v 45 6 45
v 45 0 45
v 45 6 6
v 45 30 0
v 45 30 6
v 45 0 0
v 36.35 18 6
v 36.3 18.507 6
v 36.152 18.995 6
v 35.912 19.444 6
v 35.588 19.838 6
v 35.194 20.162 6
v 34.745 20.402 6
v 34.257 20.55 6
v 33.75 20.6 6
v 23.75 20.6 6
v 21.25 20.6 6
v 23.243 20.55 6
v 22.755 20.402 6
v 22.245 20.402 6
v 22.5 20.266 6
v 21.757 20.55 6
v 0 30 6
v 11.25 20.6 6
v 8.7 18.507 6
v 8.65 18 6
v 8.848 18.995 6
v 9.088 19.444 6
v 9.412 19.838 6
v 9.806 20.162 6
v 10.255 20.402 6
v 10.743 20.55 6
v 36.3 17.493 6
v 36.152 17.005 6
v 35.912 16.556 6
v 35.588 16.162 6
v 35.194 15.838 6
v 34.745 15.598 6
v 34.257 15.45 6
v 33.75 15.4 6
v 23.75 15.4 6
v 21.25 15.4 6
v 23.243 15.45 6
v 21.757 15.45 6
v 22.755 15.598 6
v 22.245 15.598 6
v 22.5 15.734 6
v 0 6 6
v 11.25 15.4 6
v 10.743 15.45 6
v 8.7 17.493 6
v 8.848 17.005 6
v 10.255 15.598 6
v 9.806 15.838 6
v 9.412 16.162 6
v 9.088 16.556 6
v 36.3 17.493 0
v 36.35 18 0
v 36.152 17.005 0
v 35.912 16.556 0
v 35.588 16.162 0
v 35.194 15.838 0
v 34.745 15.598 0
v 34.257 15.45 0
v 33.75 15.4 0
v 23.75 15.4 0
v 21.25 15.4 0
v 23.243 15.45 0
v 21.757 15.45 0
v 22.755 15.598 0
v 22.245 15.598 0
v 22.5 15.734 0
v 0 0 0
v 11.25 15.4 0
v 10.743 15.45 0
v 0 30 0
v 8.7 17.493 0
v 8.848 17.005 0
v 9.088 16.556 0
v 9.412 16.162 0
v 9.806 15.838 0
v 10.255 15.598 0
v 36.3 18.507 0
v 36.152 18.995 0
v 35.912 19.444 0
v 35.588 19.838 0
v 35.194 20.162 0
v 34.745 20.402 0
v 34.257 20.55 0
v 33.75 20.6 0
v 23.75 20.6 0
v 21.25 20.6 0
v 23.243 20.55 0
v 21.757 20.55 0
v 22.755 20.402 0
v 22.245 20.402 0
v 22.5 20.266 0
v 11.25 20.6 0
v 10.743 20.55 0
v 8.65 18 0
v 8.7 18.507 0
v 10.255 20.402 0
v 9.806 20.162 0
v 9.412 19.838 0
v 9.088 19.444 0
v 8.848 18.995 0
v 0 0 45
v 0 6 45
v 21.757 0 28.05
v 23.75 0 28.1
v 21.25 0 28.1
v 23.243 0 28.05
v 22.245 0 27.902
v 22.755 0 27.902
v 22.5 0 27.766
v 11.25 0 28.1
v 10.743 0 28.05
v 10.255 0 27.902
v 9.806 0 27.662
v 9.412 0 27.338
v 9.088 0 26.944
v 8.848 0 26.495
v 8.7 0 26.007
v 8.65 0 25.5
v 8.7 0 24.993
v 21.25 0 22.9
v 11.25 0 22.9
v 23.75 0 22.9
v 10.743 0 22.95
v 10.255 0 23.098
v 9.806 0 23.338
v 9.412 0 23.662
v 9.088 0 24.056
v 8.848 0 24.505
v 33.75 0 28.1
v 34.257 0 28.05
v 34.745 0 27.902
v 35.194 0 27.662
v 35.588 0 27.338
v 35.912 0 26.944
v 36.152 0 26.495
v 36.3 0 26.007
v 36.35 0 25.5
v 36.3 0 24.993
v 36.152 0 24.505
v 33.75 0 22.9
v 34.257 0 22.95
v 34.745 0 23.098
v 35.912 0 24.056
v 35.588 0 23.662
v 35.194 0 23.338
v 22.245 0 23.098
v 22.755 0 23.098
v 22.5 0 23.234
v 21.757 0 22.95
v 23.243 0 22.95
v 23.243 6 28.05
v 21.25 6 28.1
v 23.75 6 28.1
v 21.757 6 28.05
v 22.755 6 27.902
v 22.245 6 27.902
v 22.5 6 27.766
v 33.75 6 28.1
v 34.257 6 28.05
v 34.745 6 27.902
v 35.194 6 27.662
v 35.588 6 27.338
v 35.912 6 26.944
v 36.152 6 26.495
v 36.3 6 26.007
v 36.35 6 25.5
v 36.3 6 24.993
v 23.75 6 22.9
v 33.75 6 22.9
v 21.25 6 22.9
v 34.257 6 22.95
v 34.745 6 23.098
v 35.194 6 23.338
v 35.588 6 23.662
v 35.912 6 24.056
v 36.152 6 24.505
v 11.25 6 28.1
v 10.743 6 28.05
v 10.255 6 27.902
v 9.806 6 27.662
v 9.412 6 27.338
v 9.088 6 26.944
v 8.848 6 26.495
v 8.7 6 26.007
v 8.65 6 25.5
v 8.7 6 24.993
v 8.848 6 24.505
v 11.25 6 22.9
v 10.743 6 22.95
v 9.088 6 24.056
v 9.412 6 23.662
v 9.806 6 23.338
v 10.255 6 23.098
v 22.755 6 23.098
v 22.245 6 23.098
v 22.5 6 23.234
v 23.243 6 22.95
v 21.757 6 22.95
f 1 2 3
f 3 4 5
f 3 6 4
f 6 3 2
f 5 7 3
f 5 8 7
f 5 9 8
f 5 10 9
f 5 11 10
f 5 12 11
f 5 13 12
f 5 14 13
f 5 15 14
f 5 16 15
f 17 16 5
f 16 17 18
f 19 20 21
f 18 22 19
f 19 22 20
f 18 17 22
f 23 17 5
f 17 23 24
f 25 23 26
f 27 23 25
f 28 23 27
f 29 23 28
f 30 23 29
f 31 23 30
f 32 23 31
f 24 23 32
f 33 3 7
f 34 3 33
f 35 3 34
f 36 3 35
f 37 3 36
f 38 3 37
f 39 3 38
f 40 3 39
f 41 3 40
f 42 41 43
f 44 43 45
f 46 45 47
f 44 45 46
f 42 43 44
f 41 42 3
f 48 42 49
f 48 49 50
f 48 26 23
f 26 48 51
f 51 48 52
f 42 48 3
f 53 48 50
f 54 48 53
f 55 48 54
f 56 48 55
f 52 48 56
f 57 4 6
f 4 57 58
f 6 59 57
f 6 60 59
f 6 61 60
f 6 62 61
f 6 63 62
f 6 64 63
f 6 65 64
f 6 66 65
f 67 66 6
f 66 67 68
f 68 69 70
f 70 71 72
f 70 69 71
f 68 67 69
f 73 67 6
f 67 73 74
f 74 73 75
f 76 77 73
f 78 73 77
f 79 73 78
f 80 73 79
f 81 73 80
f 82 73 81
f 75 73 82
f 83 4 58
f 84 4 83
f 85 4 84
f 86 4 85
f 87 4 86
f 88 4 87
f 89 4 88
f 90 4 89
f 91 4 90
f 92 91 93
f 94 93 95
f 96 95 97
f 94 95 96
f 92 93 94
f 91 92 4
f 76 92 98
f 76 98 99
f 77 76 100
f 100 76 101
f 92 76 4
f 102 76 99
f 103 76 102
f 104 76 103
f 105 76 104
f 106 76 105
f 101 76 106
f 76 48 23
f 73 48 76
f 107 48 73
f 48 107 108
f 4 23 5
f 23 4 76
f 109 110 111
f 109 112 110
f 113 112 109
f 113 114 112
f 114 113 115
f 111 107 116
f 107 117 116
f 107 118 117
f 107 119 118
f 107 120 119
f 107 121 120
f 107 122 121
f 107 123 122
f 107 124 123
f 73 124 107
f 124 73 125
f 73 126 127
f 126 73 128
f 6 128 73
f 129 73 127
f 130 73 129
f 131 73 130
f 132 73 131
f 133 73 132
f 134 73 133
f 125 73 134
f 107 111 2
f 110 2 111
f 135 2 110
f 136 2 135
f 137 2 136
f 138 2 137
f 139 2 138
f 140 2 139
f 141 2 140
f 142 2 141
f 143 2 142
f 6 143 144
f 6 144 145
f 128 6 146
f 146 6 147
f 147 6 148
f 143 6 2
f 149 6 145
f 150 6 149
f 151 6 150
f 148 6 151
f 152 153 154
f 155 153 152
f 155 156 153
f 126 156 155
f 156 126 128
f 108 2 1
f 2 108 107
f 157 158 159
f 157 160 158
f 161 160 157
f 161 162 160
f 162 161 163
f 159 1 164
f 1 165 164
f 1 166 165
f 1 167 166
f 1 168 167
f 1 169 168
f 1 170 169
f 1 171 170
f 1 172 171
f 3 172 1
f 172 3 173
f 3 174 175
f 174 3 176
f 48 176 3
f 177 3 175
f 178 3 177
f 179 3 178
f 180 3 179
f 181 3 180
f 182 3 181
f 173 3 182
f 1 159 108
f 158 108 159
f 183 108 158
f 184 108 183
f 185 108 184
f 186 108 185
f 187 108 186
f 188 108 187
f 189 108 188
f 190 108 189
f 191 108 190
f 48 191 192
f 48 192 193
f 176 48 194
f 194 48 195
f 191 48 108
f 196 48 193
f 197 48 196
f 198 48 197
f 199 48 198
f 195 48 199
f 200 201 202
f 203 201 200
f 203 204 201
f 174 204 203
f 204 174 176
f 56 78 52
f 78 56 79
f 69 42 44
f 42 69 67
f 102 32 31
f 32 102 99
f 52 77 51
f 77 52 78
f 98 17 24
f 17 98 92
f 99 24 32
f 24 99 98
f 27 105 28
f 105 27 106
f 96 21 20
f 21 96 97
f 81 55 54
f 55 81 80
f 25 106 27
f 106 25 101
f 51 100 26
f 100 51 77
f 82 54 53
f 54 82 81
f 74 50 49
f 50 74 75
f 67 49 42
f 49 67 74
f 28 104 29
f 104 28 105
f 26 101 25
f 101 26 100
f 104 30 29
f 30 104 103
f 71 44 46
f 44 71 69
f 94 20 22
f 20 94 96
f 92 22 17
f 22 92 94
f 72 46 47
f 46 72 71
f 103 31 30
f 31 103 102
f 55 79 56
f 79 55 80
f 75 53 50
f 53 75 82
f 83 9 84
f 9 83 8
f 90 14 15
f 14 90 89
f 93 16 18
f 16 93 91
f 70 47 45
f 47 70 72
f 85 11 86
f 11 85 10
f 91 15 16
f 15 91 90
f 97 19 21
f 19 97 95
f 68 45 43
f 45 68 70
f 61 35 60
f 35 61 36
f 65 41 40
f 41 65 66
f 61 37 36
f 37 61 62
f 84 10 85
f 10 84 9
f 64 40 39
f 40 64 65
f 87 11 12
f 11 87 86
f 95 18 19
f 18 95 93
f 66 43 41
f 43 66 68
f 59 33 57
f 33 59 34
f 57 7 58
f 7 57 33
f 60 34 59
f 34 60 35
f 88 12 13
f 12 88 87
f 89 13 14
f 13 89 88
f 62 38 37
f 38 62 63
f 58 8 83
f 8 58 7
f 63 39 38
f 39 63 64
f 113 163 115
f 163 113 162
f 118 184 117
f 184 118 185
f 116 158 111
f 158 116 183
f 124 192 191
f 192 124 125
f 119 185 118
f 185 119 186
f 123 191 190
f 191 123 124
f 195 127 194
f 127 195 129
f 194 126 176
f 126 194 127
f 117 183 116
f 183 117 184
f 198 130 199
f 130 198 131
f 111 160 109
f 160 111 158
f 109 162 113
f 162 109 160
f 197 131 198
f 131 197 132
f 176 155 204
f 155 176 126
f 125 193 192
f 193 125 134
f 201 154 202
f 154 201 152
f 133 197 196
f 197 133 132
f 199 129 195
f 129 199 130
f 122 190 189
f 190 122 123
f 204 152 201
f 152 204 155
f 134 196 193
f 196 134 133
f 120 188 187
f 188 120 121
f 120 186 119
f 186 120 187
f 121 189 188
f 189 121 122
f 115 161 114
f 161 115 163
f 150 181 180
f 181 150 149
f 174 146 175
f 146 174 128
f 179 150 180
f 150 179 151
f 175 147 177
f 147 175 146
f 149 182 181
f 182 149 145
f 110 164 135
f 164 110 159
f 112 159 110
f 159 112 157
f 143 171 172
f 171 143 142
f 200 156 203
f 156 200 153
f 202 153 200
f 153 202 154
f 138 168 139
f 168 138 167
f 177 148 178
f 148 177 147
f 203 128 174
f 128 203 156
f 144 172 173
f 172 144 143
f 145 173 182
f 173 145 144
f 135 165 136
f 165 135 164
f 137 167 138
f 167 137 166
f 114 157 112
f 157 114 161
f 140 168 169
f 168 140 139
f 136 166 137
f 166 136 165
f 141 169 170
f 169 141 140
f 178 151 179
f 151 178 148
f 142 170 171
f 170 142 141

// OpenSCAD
$fn = 32;
// Slotted L-bracket with adjustment slots on both legs.

width = 45;
depth = 30;
height = 45;
wall = 6;
slot_w = 5.2;
slot_l = 10;

difference() {
    union() {
        cube([width, depth, wall]);
        cube([width, wall, height]);
    }
    for (x = [width / 4, 3 * width / 4 - slot_l])
        hull() {
            translate([x, depth / 2 + wall / 2, -1])
                cylinder(h = wall + 2, d = slot_w);
            translate([x + slot_l, depth / 2 + wall / 2, -1])
                cylinder(h = wall + 2, d = slot_w);
        }
    for (x = [width / 4, 3 * width / 4 - slot_l])
        hull() {
            translate([x, -1, height / 2 + wall / 2]) rotate([-90, 0, 0])
                cylinder(h = wall + 2, d = slot_w);
            translate([x + slot_l, -1, height / 2 + wall / 2]) rotate([-90, 0, 0])
                cylinder(h = wall + 2, d = slot_w);
        }
}
